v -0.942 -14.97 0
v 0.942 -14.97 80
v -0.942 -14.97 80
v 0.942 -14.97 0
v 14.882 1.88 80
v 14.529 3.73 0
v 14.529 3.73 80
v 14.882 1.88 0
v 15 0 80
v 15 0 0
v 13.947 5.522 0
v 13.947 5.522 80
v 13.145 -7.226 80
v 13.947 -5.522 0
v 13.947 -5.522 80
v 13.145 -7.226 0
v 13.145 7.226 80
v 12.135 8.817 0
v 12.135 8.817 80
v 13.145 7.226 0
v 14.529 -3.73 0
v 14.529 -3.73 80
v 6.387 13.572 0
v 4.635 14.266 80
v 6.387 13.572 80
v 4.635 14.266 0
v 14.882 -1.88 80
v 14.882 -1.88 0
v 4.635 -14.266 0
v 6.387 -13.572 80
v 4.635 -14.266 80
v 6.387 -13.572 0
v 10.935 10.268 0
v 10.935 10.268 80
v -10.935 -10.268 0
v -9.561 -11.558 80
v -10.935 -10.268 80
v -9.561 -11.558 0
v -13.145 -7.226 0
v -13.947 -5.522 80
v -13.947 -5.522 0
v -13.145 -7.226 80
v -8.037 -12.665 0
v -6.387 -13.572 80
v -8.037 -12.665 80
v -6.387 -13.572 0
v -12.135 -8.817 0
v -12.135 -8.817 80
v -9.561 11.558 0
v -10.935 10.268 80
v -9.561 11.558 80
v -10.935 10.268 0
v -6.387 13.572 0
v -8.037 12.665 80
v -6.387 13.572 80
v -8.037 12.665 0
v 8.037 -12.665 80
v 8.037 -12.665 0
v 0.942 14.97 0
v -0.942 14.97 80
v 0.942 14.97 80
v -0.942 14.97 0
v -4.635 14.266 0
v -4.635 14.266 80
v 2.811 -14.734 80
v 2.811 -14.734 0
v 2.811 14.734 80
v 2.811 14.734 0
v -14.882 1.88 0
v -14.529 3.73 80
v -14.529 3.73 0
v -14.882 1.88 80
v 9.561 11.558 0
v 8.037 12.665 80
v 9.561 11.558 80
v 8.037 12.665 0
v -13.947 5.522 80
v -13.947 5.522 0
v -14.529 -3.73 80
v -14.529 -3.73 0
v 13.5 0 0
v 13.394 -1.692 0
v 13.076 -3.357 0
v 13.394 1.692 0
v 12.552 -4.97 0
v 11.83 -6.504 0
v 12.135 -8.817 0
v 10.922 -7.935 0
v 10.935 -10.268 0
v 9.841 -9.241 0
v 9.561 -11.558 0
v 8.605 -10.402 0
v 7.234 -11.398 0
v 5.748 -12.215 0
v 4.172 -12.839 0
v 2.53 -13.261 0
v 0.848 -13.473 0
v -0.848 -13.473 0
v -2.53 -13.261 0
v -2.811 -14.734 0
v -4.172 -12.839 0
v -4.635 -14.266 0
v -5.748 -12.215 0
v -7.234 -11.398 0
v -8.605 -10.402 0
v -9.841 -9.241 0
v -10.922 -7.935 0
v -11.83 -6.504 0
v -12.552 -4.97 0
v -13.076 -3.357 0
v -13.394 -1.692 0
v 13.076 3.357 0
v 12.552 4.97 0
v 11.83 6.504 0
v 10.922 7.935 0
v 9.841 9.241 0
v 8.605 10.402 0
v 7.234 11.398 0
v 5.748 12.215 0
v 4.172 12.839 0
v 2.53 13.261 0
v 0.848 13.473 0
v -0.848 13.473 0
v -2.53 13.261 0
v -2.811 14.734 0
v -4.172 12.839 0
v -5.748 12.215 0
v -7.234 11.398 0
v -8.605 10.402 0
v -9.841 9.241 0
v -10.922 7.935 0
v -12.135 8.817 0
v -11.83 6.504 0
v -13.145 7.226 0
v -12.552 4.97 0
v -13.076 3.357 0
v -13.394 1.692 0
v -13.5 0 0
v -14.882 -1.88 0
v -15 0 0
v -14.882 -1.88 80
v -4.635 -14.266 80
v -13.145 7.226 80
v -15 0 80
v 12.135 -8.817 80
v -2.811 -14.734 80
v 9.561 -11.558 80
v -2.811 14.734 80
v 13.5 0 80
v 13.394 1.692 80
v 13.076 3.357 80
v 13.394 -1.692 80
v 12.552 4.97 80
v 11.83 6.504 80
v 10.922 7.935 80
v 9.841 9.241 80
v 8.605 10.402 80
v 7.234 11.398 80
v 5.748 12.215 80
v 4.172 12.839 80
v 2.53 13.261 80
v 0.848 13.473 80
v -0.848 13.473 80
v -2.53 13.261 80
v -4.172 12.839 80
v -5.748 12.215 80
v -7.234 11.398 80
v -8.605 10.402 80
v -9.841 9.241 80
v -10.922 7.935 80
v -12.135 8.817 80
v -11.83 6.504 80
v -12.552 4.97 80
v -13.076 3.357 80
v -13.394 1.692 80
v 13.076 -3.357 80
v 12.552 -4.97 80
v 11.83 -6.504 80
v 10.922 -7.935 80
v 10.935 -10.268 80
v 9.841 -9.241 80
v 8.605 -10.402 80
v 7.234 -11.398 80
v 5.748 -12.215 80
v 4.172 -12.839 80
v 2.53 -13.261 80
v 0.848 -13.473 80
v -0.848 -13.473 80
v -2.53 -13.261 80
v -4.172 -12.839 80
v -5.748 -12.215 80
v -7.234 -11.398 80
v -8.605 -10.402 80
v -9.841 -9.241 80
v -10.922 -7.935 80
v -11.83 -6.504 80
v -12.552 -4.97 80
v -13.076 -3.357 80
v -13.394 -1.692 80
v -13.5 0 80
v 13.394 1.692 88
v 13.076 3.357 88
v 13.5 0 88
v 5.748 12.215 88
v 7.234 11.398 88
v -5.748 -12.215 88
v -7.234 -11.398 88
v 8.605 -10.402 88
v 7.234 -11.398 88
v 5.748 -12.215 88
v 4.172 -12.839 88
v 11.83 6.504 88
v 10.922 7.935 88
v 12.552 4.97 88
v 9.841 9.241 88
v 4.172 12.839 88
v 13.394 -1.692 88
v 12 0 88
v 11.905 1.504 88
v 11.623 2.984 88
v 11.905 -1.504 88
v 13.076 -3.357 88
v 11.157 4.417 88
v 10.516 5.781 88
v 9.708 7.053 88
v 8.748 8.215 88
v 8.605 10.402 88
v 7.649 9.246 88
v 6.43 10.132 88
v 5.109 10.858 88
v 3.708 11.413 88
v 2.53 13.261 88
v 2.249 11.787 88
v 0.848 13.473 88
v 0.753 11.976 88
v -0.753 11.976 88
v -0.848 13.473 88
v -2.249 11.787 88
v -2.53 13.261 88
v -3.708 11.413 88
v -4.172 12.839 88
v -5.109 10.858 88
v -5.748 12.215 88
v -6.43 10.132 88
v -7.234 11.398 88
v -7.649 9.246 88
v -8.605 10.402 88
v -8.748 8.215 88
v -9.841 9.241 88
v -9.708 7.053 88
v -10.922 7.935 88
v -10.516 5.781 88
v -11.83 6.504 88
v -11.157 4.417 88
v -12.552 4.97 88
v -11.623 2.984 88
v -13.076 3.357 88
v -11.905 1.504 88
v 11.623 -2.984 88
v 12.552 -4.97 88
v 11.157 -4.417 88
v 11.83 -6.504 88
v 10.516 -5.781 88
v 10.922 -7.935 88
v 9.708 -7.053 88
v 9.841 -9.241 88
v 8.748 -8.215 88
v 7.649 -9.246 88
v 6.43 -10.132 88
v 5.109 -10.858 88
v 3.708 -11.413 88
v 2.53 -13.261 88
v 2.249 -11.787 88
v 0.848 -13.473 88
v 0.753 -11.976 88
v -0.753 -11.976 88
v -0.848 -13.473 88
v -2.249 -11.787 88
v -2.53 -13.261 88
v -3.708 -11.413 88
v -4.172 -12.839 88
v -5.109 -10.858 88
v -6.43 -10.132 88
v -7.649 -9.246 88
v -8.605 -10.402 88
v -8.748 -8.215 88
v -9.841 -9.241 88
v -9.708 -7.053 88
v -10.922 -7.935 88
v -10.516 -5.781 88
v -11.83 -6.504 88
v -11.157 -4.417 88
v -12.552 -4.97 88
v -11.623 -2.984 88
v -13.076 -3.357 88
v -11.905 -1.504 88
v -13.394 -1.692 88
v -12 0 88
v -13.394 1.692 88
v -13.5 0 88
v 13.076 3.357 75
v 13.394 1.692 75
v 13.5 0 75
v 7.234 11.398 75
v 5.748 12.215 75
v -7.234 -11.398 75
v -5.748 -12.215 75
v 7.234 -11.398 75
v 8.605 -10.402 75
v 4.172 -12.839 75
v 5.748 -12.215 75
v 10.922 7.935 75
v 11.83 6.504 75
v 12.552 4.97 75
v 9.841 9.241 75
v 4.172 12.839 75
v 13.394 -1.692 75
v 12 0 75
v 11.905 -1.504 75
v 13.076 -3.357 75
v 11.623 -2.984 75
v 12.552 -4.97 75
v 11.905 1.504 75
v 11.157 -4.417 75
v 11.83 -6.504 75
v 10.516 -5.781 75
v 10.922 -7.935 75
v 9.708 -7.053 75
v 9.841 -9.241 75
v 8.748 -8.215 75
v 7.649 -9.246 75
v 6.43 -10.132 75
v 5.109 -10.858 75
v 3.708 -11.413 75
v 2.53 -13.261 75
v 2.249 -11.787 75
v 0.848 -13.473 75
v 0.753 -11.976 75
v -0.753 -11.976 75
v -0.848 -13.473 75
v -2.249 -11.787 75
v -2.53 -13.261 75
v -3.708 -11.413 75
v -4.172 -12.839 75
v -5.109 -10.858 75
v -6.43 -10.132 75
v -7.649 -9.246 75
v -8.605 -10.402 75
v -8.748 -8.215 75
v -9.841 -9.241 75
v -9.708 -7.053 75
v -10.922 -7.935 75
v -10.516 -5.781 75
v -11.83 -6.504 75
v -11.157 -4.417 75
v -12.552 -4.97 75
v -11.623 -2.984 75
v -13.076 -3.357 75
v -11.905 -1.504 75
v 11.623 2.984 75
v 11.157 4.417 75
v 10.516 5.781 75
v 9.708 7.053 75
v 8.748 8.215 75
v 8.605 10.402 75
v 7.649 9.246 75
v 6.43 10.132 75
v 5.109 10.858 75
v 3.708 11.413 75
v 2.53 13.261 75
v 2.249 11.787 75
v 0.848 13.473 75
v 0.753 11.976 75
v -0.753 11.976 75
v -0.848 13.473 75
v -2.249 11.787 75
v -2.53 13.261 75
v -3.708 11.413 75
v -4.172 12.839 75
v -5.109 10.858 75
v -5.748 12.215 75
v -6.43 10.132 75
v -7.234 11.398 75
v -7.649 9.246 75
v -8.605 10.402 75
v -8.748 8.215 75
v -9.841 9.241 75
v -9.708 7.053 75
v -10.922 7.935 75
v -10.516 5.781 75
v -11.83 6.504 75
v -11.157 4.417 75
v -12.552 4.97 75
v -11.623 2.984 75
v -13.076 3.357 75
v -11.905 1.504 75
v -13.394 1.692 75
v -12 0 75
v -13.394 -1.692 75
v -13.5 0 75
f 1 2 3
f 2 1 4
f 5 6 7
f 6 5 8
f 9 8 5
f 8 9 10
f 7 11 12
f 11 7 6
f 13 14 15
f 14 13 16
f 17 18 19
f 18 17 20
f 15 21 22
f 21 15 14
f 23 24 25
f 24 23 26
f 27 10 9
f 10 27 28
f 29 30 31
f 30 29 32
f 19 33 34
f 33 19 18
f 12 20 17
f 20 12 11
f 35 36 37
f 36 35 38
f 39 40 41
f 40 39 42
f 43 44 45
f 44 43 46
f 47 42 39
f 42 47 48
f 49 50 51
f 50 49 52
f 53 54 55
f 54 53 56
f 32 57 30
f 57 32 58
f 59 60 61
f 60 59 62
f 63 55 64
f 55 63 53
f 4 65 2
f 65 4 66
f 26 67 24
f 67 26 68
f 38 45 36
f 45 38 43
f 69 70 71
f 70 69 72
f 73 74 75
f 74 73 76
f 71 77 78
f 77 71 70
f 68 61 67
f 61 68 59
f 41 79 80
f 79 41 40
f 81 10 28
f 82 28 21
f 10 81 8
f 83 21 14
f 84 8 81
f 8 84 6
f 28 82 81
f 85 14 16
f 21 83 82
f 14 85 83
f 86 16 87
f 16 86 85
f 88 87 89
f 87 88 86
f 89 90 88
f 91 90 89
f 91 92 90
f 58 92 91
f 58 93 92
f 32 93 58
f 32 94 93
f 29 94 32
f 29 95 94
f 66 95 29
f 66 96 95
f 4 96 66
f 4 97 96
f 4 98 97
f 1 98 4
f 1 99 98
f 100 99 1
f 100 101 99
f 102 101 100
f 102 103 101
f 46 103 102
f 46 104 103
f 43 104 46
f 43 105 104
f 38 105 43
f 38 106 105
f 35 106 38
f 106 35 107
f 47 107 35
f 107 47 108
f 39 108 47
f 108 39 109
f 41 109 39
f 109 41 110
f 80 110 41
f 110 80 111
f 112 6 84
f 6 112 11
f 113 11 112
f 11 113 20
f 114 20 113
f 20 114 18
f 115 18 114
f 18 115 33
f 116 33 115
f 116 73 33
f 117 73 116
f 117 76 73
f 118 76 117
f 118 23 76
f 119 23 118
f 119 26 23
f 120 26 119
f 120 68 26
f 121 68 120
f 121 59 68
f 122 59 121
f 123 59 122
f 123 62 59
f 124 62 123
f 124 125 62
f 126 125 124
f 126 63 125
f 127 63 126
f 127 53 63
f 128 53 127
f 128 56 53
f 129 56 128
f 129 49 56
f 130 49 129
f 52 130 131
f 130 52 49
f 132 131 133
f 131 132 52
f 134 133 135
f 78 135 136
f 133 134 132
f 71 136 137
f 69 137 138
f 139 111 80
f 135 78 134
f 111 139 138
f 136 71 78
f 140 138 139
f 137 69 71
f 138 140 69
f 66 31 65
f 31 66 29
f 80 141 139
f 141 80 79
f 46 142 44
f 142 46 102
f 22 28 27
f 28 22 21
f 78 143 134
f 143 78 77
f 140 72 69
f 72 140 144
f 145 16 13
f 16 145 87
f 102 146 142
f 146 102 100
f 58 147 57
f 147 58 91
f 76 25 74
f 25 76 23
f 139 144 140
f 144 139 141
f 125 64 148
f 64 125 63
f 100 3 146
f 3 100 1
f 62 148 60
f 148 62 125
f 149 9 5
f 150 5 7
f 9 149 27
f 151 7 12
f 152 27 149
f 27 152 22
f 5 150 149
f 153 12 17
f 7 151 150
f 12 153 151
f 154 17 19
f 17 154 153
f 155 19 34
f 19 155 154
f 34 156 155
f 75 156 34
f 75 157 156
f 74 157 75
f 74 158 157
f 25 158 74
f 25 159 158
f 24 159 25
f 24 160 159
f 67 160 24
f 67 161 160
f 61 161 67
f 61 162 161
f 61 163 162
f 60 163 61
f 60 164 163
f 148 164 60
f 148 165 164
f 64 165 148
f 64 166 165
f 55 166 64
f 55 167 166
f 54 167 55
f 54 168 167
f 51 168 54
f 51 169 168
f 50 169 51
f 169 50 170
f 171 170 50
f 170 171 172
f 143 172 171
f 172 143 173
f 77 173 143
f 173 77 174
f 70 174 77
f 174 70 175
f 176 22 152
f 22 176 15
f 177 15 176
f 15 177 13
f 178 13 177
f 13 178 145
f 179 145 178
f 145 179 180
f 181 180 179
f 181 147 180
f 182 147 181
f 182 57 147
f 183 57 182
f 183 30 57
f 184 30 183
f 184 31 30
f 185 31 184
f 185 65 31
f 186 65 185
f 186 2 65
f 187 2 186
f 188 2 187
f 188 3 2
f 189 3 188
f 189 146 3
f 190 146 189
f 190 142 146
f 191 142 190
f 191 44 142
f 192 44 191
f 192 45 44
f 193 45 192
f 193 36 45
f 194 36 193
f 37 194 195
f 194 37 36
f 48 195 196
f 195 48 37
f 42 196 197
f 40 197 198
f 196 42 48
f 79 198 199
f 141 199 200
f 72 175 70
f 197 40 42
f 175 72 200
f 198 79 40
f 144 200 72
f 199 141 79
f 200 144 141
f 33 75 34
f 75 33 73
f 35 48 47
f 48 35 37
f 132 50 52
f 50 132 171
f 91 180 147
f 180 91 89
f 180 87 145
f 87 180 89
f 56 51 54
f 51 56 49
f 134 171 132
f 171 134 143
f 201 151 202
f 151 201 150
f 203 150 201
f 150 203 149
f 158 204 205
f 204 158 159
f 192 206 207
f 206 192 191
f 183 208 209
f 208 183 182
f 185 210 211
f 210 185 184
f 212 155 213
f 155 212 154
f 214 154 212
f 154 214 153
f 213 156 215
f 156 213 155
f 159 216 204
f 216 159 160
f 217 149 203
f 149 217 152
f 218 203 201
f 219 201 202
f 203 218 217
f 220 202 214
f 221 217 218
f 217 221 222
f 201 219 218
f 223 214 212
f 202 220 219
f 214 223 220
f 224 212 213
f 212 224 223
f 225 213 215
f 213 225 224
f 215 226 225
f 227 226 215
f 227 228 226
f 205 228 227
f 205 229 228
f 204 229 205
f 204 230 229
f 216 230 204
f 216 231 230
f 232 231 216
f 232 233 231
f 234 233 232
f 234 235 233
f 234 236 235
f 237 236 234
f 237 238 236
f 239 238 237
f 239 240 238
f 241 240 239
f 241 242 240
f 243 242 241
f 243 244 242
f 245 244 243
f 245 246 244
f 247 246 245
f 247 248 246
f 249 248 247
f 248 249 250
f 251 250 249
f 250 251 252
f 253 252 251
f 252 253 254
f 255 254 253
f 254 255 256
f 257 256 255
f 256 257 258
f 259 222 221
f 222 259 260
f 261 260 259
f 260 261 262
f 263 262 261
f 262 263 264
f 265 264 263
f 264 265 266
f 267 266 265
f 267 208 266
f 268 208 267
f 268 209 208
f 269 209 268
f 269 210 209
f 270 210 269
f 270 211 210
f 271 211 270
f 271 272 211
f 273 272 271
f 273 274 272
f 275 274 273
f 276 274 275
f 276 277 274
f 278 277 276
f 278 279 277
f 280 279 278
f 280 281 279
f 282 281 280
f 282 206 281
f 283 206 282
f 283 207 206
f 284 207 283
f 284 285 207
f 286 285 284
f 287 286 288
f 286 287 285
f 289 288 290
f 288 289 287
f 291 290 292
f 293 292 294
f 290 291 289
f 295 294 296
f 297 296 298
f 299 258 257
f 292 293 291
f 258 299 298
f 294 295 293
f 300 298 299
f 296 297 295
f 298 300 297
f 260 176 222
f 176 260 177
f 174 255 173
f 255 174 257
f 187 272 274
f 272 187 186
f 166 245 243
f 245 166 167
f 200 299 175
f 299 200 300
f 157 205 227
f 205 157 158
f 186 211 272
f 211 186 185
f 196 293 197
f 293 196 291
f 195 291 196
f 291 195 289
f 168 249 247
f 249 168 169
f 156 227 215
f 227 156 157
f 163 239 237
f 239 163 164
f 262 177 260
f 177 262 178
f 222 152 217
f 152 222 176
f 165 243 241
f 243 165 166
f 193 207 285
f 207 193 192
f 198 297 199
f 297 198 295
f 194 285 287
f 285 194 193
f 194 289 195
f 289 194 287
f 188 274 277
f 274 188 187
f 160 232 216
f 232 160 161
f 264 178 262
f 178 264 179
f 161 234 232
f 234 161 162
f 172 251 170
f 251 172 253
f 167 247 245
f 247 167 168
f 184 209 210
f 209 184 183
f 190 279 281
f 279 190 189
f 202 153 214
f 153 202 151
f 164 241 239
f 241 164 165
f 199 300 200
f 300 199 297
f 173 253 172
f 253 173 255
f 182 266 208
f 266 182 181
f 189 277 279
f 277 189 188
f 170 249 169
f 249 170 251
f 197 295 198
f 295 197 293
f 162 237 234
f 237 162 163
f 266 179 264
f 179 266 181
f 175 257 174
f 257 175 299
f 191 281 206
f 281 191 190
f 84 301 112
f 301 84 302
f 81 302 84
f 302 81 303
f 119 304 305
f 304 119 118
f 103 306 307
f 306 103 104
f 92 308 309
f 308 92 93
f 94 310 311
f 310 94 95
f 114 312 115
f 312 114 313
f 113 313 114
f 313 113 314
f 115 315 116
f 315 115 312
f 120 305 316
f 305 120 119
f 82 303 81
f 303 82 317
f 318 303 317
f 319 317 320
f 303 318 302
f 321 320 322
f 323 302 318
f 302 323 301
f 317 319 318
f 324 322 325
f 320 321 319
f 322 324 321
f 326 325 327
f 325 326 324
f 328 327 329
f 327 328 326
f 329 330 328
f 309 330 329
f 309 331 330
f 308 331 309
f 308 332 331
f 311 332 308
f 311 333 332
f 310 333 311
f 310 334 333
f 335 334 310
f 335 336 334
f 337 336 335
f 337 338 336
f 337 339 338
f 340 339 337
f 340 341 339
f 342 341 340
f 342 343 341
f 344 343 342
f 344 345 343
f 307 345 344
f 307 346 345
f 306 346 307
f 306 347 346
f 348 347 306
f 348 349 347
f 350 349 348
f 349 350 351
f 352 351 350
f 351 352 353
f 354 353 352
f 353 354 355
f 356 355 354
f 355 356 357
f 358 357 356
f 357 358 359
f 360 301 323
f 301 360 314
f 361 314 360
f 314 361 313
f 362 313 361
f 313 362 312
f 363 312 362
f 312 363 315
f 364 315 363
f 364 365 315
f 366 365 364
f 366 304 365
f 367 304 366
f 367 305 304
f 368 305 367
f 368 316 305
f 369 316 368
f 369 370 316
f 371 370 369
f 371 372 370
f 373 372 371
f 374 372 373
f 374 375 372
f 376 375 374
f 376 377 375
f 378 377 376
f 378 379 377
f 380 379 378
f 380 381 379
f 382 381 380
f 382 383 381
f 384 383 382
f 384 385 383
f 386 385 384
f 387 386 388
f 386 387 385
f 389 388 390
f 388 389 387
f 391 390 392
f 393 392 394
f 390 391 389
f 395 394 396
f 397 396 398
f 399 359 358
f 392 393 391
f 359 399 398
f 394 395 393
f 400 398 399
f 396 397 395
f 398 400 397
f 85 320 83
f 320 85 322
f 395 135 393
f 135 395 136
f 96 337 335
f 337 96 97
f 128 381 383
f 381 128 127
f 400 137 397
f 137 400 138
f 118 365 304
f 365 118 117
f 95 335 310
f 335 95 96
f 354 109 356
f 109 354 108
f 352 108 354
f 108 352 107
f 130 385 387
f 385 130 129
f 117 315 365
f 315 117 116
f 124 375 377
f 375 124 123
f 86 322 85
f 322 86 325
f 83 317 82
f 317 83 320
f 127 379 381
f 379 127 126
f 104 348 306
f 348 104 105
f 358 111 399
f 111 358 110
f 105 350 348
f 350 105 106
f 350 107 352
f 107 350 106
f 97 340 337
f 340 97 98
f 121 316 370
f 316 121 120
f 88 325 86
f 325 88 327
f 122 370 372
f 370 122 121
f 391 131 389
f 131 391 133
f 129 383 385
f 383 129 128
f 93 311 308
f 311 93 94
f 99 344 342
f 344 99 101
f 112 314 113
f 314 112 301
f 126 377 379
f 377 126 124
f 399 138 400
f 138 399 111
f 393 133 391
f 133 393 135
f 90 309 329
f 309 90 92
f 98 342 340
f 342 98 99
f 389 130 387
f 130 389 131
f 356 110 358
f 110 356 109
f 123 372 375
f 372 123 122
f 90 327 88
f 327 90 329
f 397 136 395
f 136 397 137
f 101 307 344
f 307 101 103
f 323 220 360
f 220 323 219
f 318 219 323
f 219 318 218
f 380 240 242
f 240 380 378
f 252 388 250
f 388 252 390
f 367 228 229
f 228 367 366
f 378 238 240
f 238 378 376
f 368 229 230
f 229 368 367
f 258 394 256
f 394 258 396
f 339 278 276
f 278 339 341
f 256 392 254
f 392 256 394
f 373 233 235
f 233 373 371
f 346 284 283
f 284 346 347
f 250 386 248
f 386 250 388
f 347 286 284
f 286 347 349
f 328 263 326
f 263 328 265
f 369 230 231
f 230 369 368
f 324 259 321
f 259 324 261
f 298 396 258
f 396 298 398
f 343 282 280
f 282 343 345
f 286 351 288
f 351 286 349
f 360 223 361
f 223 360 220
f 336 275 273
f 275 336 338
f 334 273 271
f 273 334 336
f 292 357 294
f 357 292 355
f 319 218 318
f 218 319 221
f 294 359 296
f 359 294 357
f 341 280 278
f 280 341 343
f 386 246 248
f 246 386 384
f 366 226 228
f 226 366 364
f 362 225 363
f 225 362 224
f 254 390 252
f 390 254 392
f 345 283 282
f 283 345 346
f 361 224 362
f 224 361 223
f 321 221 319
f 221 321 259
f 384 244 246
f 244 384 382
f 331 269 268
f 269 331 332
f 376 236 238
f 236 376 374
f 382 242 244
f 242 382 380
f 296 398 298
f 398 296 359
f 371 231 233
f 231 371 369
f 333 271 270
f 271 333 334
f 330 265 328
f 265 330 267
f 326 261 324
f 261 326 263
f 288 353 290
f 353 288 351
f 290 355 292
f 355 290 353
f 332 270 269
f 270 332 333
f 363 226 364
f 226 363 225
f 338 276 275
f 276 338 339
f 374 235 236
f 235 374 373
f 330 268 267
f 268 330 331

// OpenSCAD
diameter = 30;
wallThickness = 1.5;
height = 80;
interlockHeight = 8;
interlockOD = diameter-3;

module mainShape(){
	
	cylinder (height, diameter/2, diameter/2, $fn=50);
	translate ([0,0,height]) cylinder (interlockHeight, interlockOD/2, interlockOD/2, $fn=50);
}

module cutout(){
	translate ([0,0,-1]) cylinder (height-4, diameter/2-wallThickness, diameter/2-wallThickness, $fn=50);
	translate ([0,0,height-6]) cylinder (interlockHeight+7, interlockOD/2-wallThickness, interlockOD/2-wallThickness, $fn=50);
}

difference (){
	mainShape();
	cutout();
}
